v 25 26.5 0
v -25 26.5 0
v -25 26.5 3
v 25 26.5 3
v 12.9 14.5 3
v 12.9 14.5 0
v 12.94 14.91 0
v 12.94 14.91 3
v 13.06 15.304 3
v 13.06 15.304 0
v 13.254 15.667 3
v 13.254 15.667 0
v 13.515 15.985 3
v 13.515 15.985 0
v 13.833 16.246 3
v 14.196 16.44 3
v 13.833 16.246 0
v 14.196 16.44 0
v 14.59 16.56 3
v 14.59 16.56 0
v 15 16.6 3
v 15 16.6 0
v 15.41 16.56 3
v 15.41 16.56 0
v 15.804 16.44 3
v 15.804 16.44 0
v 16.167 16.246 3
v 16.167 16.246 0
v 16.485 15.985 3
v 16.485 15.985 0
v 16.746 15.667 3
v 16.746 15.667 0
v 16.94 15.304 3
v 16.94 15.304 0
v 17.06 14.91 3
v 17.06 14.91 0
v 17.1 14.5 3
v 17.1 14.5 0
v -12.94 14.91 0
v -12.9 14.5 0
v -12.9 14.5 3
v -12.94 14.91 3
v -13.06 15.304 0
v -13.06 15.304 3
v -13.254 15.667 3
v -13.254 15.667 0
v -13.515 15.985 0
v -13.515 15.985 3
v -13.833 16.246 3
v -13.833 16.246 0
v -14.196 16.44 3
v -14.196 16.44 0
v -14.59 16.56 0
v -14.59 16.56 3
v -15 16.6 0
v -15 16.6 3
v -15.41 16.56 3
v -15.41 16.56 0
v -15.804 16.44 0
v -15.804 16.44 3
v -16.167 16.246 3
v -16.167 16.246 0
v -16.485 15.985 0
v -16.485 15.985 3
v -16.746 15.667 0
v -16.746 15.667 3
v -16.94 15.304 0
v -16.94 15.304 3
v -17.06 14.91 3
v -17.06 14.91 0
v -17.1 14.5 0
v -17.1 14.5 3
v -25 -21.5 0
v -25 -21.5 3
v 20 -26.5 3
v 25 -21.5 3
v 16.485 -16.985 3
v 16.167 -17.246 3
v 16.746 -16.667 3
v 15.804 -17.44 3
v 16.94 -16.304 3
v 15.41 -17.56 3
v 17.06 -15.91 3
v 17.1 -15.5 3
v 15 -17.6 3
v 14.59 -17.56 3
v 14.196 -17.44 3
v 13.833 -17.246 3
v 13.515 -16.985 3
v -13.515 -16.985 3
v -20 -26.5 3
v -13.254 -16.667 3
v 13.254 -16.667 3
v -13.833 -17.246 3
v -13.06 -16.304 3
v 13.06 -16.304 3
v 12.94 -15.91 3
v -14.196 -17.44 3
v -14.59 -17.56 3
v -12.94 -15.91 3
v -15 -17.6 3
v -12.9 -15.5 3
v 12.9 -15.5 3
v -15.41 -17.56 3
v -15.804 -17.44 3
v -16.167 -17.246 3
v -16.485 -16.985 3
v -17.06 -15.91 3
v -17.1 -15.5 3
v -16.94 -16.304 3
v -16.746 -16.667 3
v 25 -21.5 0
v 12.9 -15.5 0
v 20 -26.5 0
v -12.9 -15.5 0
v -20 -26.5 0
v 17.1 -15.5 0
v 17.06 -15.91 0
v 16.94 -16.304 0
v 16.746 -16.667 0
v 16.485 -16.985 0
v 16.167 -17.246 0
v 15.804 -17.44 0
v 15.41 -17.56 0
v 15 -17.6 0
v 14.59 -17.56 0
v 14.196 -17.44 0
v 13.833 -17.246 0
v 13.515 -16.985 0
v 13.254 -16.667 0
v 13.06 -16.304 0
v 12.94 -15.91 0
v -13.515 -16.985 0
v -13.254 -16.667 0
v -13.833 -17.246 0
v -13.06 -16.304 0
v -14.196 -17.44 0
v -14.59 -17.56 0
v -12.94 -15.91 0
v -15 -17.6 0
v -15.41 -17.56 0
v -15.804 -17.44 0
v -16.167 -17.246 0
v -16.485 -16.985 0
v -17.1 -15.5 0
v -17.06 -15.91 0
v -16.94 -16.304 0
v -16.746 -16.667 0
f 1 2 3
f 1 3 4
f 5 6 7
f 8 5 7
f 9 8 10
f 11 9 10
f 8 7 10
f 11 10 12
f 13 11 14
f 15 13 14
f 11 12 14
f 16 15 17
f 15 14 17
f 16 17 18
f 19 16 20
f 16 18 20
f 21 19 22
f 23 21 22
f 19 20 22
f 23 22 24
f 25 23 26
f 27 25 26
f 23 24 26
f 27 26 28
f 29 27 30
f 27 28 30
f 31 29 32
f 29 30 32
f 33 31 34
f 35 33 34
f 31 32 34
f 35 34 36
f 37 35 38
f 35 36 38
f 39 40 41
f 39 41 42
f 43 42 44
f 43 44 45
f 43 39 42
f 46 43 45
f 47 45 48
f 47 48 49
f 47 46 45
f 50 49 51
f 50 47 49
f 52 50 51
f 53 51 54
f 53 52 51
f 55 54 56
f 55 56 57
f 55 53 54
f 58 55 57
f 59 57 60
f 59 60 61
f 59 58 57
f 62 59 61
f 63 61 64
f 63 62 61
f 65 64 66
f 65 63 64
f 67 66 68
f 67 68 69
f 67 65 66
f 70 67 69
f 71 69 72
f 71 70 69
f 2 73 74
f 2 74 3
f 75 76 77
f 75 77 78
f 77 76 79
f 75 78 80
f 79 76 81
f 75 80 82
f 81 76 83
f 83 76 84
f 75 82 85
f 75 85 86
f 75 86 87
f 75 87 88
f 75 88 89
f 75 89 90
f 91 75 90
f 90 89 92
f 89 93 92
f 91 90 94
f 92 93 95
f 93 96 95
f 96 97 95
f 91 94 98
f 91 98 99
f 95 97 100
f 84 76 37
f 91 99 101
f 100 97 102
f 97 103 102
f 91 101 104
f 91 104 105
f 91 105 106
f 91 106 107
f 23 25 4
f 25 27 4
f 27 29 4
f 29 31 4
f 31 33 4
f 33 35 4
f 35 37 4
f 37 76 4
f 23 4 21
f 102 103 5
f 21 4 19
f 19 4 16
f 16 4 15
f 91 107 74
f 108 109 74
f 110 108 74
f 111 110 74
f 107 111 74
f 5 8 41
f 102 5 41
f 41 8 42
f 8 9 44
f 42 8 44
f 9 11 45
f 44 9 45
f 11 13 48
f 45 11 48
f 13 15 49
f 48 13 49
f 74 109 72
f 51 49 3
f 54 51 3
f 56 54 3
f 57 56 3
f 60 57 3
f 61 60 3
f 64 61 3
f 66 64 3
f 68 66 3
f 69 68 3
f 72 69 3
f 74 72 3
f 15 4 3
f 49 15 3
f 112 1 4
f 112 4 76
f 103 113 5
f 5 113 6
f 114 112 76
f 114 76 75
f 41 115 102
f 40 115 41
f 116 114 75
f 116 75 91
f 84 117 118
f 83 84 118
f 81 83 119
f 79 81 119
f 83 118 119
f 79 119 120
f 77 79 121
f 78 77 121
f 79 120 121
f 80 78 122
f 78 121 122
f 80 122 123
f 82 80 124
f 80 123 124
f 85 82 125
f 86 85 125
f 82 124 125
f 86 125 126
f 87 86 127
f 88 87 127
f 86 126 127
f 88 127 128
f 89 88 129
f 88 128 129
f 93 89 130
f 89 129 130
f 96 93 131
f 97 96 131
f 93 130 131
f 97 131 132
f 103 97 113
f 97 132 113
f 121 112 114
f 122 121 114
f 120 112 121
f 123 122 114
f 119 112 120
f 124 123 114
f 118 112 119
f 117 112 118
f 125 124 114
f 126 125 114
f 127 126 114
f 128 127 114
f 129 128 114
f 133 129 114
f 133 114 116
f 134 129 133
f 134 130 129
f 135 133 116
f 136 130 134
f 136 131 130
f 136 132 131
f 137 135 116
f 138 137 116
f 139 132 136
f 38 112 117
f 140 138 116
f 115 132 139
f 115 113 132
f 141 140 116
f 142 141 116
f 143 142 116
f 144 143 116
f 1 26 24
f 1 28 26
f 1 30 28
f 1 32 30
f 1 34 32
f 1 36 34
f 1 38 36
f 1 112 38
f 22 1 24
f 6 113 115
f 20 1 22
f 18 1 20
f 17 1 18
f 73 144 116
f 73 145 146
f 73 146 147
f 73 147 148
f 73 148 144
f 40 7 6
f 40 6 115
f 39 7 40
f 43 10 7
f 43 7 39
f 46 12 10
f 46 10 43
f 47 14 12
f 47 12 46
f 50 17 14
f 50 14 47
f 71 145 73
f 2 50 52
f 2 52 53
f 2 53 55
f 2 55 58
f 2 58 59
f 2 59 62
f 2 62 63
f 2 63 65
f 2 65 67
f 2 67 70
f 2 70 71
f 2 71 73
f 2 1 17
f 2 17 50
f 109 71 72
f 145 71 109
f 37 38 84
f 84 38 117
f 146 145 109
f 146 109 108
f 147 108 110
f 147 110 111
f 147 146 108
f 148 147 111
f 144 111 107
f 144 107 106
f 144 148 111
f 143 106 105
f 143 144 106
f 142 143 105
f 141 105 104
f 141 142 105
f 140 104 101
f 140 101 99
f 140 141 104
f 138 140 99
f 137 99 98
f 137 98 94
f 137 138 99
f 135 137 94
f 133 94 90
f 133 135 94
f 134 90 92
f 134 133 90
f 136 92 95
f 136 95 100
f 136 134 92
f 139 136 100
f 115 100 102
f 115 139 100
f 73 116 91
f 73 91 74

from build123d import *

# Parameters (mm, degrees)
RESSALTO_EXTRUS_O1_DEPTH = 3


with BuildPart() as part:
    # Esboço1 → Ressalto-extrusão1 (new body)
    with BuildSketch(Plane.XY):
        Polygon((-25, -21.5), (-25, 26.5), (25, 26.5), (25, -21.5), (20, -26.5), (-20, -26.5), align=None)
        with BuildLine():
            Line((17.1, 14.5), (17.1, -15.5))
            ThreePointArc((17.1, -15.5), (15, -17.6), (12.9, -15.5))
            Line((12.9, -15.5), (12.9, 14.5))
            ThreePointArc((12.9, 14.5), (15, 16.6), (17.1, 14.5))
        make_face(mode=Mode.SUBTRACT)
        with BuildLine():
            Line((-17.1, 14.5), (-17.1, -15.5))
            ThreePointArc((-17.1, -15.5), (-15, -17.6), (-12.9, -15.5))
            Line((-12.9, -15.5), (-12.9, 14.5))
            ThreePointArc((-12.9, 14.5), (-15, 16.6), (-17.1, 14.5))
        make_face(mode=Mode.SUBTRACT)
    extrude(amount=RESSALTO_EXTRUS_O1_DEPTH)


solid = part.part
